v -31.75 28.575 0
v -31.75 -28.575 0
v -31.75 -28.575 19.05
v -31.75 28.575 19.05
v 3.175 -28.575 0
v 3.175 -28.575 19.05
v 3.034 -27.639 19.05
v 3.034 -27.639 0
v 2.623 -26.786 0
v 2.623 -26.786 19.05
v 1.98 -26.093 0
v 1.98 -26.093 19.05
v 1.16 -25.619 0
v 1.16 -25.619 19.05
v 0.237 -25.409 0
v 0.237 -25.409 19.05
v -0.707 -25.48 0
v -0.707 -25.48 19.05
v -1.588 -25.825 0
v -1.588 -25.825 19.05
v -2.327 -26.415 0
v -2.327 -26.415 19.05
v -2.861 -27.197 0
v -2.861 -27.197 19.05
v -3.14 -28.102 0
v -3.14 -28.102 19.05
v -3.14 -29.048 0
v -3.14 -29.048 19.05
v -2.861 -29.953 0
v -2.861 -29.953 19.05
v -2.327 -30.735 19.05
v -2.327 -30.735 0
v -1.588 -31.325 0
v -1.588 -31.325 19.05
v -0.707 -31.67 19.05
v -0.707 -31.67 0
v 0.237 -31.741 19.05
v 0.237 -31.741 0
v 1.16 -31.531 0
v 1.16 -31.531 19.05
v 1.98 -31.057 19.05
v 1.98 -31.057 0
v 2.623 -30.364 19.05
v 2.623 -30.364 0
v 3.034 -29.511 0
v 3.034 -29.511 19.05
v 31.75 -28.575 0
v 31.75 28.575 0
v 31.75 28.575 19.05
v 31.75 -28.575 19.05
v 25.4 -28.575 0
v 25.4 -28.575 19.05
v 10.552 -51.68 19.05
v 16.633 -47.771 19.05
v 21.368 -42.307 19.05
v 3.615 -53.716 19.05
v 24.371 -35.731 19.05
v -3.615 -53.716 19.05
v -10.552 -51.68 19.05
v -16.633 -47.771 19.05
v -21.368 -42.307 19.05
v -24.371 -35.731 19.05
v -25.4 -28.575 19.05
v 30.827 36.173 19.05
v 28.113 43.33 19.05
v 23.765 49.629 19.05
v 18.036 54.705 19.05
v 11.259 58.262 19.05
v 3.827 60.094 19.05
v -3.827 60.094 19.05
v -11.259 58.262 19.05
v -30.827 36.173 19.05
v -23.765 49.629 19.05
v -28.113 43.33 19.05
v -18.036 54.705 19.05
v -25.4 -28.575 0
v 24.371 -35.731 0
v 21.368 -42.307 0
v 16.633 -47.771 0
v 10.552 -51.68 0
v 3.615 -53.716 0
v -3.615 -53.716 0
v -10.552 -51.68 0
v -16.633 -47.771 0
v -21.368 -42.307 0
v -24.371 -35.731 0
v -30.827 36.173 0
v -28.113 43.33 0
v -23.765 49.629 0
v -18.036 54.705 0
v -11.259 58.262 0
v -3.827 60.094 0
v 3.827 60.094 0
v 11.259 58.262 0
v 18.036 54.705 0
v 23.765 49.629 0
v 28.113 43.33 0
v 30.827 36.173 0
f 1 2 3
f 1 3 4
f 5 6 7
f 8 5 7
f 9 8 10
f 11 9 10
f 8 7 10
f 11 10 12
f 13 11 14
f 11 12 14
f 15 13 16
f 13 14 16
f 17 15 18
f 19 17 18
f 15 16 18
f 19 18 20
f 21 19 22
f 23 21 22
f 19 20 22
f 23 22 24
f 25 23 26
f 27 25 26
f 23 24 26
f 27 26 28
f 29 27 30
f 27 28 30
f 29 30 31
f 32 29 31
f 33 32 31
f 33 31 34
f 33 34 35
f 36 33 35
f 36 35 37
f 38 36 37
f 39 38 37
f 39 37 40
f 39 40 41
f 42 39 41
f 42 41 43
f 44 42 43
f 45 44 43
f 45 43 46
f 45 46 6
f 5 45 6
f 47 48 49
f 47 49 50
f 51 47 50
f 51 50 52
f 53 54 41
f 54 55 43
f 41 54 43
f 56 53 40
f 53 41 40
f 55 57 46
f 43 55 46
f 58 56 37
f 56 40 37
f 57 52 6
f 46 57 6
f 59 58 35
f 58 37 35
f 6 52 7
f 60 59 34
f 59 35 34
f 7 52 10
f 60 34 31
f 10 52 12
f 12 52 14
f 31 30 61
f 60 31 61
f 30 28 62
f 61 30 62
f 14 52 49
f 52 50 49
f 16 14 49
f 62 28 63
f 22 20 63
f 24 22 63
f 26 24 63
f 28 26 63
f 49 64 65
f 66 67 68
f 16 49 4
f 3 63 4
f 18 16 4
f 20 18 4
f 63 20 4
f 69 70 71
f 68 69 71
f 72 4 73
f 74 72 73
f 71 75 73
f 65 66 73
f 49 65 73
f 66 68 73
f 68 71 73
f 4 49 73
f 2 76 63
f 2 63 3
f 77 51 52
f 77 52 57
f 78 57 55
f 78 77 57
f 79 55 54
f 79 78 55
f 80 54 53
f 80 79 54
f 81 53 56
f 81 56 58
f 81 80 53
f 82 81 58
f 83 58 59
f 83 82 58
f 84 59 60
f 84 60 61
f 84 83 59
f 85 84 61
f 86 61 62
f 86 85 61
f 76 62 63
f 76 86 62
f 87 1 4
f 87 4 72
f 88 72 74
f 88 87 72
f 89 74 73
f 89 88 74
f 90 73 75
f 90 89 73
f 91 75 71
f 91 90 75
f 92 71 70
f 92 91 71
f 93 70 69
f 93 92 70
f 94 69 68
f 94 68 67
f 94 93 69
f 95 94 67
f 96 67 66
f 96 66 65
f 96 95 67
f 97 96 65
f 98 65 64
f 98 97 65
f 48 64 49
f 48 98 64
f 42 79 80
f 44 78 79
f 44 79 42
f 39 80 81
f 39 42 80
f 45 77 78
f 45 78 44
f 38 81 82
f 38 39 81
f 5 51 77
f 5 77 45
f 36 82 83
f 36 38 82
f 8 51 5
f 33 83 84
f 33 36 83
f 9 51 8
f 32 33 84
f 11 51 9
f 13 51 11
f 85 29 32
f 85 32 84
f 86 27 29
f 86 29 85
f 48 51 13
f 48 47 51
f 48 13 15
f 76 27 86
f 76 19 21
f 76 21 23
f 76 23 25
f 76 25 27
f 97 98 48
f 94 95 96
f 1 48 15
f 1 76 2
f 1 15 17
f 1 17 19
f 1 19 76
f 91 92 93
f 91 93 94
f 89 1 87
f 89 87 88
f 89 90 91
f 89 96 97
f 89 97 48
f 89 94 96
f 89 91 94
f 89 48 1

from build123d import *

# Parameters (mm, degrees)
BOSS_EXTRUDE1_DEPTH         = 19.05
F_1_4_0_25_DIAMETER_HOLE1_D = 6.35


with BuildPart() as part:
    # Sketch2 → Boss-Extrude1 (new body)
    with BuildSketch(Plane.XY):
        with BuildLine():
            Line((31.75, 28.575), (31.75, -28.575))
            Line((31.75, -28.575), (25.4, -28.575))
            ThreePointArc((25.4, -28.575), (0, -53.975), (-25.4, -28.575))
            Line((-25.4, -28.575), (-31.75, -28.575))
            Line((-31.75, -28.575), (-31.75, 28.575))
            ThreePointArc((-31.75, 28.575), (0, 60.325), (31.75, 28.575))
        make_face()
    extrude(amount=BOSS_EXTRUDE1_DEPTH)

    # 1/4 (0.25) Diameter Hole1 (through all)
    with Locations(Plane(origin=(0, 0, 0), x_dir=(-1, 0, 0), z_dir=(0, 0, -1))):
        with Locations((0, -28.575)):
            Hole(F_1_4_0_25_DIAMETER_HOLE1_D / 2)


solid = part.part
